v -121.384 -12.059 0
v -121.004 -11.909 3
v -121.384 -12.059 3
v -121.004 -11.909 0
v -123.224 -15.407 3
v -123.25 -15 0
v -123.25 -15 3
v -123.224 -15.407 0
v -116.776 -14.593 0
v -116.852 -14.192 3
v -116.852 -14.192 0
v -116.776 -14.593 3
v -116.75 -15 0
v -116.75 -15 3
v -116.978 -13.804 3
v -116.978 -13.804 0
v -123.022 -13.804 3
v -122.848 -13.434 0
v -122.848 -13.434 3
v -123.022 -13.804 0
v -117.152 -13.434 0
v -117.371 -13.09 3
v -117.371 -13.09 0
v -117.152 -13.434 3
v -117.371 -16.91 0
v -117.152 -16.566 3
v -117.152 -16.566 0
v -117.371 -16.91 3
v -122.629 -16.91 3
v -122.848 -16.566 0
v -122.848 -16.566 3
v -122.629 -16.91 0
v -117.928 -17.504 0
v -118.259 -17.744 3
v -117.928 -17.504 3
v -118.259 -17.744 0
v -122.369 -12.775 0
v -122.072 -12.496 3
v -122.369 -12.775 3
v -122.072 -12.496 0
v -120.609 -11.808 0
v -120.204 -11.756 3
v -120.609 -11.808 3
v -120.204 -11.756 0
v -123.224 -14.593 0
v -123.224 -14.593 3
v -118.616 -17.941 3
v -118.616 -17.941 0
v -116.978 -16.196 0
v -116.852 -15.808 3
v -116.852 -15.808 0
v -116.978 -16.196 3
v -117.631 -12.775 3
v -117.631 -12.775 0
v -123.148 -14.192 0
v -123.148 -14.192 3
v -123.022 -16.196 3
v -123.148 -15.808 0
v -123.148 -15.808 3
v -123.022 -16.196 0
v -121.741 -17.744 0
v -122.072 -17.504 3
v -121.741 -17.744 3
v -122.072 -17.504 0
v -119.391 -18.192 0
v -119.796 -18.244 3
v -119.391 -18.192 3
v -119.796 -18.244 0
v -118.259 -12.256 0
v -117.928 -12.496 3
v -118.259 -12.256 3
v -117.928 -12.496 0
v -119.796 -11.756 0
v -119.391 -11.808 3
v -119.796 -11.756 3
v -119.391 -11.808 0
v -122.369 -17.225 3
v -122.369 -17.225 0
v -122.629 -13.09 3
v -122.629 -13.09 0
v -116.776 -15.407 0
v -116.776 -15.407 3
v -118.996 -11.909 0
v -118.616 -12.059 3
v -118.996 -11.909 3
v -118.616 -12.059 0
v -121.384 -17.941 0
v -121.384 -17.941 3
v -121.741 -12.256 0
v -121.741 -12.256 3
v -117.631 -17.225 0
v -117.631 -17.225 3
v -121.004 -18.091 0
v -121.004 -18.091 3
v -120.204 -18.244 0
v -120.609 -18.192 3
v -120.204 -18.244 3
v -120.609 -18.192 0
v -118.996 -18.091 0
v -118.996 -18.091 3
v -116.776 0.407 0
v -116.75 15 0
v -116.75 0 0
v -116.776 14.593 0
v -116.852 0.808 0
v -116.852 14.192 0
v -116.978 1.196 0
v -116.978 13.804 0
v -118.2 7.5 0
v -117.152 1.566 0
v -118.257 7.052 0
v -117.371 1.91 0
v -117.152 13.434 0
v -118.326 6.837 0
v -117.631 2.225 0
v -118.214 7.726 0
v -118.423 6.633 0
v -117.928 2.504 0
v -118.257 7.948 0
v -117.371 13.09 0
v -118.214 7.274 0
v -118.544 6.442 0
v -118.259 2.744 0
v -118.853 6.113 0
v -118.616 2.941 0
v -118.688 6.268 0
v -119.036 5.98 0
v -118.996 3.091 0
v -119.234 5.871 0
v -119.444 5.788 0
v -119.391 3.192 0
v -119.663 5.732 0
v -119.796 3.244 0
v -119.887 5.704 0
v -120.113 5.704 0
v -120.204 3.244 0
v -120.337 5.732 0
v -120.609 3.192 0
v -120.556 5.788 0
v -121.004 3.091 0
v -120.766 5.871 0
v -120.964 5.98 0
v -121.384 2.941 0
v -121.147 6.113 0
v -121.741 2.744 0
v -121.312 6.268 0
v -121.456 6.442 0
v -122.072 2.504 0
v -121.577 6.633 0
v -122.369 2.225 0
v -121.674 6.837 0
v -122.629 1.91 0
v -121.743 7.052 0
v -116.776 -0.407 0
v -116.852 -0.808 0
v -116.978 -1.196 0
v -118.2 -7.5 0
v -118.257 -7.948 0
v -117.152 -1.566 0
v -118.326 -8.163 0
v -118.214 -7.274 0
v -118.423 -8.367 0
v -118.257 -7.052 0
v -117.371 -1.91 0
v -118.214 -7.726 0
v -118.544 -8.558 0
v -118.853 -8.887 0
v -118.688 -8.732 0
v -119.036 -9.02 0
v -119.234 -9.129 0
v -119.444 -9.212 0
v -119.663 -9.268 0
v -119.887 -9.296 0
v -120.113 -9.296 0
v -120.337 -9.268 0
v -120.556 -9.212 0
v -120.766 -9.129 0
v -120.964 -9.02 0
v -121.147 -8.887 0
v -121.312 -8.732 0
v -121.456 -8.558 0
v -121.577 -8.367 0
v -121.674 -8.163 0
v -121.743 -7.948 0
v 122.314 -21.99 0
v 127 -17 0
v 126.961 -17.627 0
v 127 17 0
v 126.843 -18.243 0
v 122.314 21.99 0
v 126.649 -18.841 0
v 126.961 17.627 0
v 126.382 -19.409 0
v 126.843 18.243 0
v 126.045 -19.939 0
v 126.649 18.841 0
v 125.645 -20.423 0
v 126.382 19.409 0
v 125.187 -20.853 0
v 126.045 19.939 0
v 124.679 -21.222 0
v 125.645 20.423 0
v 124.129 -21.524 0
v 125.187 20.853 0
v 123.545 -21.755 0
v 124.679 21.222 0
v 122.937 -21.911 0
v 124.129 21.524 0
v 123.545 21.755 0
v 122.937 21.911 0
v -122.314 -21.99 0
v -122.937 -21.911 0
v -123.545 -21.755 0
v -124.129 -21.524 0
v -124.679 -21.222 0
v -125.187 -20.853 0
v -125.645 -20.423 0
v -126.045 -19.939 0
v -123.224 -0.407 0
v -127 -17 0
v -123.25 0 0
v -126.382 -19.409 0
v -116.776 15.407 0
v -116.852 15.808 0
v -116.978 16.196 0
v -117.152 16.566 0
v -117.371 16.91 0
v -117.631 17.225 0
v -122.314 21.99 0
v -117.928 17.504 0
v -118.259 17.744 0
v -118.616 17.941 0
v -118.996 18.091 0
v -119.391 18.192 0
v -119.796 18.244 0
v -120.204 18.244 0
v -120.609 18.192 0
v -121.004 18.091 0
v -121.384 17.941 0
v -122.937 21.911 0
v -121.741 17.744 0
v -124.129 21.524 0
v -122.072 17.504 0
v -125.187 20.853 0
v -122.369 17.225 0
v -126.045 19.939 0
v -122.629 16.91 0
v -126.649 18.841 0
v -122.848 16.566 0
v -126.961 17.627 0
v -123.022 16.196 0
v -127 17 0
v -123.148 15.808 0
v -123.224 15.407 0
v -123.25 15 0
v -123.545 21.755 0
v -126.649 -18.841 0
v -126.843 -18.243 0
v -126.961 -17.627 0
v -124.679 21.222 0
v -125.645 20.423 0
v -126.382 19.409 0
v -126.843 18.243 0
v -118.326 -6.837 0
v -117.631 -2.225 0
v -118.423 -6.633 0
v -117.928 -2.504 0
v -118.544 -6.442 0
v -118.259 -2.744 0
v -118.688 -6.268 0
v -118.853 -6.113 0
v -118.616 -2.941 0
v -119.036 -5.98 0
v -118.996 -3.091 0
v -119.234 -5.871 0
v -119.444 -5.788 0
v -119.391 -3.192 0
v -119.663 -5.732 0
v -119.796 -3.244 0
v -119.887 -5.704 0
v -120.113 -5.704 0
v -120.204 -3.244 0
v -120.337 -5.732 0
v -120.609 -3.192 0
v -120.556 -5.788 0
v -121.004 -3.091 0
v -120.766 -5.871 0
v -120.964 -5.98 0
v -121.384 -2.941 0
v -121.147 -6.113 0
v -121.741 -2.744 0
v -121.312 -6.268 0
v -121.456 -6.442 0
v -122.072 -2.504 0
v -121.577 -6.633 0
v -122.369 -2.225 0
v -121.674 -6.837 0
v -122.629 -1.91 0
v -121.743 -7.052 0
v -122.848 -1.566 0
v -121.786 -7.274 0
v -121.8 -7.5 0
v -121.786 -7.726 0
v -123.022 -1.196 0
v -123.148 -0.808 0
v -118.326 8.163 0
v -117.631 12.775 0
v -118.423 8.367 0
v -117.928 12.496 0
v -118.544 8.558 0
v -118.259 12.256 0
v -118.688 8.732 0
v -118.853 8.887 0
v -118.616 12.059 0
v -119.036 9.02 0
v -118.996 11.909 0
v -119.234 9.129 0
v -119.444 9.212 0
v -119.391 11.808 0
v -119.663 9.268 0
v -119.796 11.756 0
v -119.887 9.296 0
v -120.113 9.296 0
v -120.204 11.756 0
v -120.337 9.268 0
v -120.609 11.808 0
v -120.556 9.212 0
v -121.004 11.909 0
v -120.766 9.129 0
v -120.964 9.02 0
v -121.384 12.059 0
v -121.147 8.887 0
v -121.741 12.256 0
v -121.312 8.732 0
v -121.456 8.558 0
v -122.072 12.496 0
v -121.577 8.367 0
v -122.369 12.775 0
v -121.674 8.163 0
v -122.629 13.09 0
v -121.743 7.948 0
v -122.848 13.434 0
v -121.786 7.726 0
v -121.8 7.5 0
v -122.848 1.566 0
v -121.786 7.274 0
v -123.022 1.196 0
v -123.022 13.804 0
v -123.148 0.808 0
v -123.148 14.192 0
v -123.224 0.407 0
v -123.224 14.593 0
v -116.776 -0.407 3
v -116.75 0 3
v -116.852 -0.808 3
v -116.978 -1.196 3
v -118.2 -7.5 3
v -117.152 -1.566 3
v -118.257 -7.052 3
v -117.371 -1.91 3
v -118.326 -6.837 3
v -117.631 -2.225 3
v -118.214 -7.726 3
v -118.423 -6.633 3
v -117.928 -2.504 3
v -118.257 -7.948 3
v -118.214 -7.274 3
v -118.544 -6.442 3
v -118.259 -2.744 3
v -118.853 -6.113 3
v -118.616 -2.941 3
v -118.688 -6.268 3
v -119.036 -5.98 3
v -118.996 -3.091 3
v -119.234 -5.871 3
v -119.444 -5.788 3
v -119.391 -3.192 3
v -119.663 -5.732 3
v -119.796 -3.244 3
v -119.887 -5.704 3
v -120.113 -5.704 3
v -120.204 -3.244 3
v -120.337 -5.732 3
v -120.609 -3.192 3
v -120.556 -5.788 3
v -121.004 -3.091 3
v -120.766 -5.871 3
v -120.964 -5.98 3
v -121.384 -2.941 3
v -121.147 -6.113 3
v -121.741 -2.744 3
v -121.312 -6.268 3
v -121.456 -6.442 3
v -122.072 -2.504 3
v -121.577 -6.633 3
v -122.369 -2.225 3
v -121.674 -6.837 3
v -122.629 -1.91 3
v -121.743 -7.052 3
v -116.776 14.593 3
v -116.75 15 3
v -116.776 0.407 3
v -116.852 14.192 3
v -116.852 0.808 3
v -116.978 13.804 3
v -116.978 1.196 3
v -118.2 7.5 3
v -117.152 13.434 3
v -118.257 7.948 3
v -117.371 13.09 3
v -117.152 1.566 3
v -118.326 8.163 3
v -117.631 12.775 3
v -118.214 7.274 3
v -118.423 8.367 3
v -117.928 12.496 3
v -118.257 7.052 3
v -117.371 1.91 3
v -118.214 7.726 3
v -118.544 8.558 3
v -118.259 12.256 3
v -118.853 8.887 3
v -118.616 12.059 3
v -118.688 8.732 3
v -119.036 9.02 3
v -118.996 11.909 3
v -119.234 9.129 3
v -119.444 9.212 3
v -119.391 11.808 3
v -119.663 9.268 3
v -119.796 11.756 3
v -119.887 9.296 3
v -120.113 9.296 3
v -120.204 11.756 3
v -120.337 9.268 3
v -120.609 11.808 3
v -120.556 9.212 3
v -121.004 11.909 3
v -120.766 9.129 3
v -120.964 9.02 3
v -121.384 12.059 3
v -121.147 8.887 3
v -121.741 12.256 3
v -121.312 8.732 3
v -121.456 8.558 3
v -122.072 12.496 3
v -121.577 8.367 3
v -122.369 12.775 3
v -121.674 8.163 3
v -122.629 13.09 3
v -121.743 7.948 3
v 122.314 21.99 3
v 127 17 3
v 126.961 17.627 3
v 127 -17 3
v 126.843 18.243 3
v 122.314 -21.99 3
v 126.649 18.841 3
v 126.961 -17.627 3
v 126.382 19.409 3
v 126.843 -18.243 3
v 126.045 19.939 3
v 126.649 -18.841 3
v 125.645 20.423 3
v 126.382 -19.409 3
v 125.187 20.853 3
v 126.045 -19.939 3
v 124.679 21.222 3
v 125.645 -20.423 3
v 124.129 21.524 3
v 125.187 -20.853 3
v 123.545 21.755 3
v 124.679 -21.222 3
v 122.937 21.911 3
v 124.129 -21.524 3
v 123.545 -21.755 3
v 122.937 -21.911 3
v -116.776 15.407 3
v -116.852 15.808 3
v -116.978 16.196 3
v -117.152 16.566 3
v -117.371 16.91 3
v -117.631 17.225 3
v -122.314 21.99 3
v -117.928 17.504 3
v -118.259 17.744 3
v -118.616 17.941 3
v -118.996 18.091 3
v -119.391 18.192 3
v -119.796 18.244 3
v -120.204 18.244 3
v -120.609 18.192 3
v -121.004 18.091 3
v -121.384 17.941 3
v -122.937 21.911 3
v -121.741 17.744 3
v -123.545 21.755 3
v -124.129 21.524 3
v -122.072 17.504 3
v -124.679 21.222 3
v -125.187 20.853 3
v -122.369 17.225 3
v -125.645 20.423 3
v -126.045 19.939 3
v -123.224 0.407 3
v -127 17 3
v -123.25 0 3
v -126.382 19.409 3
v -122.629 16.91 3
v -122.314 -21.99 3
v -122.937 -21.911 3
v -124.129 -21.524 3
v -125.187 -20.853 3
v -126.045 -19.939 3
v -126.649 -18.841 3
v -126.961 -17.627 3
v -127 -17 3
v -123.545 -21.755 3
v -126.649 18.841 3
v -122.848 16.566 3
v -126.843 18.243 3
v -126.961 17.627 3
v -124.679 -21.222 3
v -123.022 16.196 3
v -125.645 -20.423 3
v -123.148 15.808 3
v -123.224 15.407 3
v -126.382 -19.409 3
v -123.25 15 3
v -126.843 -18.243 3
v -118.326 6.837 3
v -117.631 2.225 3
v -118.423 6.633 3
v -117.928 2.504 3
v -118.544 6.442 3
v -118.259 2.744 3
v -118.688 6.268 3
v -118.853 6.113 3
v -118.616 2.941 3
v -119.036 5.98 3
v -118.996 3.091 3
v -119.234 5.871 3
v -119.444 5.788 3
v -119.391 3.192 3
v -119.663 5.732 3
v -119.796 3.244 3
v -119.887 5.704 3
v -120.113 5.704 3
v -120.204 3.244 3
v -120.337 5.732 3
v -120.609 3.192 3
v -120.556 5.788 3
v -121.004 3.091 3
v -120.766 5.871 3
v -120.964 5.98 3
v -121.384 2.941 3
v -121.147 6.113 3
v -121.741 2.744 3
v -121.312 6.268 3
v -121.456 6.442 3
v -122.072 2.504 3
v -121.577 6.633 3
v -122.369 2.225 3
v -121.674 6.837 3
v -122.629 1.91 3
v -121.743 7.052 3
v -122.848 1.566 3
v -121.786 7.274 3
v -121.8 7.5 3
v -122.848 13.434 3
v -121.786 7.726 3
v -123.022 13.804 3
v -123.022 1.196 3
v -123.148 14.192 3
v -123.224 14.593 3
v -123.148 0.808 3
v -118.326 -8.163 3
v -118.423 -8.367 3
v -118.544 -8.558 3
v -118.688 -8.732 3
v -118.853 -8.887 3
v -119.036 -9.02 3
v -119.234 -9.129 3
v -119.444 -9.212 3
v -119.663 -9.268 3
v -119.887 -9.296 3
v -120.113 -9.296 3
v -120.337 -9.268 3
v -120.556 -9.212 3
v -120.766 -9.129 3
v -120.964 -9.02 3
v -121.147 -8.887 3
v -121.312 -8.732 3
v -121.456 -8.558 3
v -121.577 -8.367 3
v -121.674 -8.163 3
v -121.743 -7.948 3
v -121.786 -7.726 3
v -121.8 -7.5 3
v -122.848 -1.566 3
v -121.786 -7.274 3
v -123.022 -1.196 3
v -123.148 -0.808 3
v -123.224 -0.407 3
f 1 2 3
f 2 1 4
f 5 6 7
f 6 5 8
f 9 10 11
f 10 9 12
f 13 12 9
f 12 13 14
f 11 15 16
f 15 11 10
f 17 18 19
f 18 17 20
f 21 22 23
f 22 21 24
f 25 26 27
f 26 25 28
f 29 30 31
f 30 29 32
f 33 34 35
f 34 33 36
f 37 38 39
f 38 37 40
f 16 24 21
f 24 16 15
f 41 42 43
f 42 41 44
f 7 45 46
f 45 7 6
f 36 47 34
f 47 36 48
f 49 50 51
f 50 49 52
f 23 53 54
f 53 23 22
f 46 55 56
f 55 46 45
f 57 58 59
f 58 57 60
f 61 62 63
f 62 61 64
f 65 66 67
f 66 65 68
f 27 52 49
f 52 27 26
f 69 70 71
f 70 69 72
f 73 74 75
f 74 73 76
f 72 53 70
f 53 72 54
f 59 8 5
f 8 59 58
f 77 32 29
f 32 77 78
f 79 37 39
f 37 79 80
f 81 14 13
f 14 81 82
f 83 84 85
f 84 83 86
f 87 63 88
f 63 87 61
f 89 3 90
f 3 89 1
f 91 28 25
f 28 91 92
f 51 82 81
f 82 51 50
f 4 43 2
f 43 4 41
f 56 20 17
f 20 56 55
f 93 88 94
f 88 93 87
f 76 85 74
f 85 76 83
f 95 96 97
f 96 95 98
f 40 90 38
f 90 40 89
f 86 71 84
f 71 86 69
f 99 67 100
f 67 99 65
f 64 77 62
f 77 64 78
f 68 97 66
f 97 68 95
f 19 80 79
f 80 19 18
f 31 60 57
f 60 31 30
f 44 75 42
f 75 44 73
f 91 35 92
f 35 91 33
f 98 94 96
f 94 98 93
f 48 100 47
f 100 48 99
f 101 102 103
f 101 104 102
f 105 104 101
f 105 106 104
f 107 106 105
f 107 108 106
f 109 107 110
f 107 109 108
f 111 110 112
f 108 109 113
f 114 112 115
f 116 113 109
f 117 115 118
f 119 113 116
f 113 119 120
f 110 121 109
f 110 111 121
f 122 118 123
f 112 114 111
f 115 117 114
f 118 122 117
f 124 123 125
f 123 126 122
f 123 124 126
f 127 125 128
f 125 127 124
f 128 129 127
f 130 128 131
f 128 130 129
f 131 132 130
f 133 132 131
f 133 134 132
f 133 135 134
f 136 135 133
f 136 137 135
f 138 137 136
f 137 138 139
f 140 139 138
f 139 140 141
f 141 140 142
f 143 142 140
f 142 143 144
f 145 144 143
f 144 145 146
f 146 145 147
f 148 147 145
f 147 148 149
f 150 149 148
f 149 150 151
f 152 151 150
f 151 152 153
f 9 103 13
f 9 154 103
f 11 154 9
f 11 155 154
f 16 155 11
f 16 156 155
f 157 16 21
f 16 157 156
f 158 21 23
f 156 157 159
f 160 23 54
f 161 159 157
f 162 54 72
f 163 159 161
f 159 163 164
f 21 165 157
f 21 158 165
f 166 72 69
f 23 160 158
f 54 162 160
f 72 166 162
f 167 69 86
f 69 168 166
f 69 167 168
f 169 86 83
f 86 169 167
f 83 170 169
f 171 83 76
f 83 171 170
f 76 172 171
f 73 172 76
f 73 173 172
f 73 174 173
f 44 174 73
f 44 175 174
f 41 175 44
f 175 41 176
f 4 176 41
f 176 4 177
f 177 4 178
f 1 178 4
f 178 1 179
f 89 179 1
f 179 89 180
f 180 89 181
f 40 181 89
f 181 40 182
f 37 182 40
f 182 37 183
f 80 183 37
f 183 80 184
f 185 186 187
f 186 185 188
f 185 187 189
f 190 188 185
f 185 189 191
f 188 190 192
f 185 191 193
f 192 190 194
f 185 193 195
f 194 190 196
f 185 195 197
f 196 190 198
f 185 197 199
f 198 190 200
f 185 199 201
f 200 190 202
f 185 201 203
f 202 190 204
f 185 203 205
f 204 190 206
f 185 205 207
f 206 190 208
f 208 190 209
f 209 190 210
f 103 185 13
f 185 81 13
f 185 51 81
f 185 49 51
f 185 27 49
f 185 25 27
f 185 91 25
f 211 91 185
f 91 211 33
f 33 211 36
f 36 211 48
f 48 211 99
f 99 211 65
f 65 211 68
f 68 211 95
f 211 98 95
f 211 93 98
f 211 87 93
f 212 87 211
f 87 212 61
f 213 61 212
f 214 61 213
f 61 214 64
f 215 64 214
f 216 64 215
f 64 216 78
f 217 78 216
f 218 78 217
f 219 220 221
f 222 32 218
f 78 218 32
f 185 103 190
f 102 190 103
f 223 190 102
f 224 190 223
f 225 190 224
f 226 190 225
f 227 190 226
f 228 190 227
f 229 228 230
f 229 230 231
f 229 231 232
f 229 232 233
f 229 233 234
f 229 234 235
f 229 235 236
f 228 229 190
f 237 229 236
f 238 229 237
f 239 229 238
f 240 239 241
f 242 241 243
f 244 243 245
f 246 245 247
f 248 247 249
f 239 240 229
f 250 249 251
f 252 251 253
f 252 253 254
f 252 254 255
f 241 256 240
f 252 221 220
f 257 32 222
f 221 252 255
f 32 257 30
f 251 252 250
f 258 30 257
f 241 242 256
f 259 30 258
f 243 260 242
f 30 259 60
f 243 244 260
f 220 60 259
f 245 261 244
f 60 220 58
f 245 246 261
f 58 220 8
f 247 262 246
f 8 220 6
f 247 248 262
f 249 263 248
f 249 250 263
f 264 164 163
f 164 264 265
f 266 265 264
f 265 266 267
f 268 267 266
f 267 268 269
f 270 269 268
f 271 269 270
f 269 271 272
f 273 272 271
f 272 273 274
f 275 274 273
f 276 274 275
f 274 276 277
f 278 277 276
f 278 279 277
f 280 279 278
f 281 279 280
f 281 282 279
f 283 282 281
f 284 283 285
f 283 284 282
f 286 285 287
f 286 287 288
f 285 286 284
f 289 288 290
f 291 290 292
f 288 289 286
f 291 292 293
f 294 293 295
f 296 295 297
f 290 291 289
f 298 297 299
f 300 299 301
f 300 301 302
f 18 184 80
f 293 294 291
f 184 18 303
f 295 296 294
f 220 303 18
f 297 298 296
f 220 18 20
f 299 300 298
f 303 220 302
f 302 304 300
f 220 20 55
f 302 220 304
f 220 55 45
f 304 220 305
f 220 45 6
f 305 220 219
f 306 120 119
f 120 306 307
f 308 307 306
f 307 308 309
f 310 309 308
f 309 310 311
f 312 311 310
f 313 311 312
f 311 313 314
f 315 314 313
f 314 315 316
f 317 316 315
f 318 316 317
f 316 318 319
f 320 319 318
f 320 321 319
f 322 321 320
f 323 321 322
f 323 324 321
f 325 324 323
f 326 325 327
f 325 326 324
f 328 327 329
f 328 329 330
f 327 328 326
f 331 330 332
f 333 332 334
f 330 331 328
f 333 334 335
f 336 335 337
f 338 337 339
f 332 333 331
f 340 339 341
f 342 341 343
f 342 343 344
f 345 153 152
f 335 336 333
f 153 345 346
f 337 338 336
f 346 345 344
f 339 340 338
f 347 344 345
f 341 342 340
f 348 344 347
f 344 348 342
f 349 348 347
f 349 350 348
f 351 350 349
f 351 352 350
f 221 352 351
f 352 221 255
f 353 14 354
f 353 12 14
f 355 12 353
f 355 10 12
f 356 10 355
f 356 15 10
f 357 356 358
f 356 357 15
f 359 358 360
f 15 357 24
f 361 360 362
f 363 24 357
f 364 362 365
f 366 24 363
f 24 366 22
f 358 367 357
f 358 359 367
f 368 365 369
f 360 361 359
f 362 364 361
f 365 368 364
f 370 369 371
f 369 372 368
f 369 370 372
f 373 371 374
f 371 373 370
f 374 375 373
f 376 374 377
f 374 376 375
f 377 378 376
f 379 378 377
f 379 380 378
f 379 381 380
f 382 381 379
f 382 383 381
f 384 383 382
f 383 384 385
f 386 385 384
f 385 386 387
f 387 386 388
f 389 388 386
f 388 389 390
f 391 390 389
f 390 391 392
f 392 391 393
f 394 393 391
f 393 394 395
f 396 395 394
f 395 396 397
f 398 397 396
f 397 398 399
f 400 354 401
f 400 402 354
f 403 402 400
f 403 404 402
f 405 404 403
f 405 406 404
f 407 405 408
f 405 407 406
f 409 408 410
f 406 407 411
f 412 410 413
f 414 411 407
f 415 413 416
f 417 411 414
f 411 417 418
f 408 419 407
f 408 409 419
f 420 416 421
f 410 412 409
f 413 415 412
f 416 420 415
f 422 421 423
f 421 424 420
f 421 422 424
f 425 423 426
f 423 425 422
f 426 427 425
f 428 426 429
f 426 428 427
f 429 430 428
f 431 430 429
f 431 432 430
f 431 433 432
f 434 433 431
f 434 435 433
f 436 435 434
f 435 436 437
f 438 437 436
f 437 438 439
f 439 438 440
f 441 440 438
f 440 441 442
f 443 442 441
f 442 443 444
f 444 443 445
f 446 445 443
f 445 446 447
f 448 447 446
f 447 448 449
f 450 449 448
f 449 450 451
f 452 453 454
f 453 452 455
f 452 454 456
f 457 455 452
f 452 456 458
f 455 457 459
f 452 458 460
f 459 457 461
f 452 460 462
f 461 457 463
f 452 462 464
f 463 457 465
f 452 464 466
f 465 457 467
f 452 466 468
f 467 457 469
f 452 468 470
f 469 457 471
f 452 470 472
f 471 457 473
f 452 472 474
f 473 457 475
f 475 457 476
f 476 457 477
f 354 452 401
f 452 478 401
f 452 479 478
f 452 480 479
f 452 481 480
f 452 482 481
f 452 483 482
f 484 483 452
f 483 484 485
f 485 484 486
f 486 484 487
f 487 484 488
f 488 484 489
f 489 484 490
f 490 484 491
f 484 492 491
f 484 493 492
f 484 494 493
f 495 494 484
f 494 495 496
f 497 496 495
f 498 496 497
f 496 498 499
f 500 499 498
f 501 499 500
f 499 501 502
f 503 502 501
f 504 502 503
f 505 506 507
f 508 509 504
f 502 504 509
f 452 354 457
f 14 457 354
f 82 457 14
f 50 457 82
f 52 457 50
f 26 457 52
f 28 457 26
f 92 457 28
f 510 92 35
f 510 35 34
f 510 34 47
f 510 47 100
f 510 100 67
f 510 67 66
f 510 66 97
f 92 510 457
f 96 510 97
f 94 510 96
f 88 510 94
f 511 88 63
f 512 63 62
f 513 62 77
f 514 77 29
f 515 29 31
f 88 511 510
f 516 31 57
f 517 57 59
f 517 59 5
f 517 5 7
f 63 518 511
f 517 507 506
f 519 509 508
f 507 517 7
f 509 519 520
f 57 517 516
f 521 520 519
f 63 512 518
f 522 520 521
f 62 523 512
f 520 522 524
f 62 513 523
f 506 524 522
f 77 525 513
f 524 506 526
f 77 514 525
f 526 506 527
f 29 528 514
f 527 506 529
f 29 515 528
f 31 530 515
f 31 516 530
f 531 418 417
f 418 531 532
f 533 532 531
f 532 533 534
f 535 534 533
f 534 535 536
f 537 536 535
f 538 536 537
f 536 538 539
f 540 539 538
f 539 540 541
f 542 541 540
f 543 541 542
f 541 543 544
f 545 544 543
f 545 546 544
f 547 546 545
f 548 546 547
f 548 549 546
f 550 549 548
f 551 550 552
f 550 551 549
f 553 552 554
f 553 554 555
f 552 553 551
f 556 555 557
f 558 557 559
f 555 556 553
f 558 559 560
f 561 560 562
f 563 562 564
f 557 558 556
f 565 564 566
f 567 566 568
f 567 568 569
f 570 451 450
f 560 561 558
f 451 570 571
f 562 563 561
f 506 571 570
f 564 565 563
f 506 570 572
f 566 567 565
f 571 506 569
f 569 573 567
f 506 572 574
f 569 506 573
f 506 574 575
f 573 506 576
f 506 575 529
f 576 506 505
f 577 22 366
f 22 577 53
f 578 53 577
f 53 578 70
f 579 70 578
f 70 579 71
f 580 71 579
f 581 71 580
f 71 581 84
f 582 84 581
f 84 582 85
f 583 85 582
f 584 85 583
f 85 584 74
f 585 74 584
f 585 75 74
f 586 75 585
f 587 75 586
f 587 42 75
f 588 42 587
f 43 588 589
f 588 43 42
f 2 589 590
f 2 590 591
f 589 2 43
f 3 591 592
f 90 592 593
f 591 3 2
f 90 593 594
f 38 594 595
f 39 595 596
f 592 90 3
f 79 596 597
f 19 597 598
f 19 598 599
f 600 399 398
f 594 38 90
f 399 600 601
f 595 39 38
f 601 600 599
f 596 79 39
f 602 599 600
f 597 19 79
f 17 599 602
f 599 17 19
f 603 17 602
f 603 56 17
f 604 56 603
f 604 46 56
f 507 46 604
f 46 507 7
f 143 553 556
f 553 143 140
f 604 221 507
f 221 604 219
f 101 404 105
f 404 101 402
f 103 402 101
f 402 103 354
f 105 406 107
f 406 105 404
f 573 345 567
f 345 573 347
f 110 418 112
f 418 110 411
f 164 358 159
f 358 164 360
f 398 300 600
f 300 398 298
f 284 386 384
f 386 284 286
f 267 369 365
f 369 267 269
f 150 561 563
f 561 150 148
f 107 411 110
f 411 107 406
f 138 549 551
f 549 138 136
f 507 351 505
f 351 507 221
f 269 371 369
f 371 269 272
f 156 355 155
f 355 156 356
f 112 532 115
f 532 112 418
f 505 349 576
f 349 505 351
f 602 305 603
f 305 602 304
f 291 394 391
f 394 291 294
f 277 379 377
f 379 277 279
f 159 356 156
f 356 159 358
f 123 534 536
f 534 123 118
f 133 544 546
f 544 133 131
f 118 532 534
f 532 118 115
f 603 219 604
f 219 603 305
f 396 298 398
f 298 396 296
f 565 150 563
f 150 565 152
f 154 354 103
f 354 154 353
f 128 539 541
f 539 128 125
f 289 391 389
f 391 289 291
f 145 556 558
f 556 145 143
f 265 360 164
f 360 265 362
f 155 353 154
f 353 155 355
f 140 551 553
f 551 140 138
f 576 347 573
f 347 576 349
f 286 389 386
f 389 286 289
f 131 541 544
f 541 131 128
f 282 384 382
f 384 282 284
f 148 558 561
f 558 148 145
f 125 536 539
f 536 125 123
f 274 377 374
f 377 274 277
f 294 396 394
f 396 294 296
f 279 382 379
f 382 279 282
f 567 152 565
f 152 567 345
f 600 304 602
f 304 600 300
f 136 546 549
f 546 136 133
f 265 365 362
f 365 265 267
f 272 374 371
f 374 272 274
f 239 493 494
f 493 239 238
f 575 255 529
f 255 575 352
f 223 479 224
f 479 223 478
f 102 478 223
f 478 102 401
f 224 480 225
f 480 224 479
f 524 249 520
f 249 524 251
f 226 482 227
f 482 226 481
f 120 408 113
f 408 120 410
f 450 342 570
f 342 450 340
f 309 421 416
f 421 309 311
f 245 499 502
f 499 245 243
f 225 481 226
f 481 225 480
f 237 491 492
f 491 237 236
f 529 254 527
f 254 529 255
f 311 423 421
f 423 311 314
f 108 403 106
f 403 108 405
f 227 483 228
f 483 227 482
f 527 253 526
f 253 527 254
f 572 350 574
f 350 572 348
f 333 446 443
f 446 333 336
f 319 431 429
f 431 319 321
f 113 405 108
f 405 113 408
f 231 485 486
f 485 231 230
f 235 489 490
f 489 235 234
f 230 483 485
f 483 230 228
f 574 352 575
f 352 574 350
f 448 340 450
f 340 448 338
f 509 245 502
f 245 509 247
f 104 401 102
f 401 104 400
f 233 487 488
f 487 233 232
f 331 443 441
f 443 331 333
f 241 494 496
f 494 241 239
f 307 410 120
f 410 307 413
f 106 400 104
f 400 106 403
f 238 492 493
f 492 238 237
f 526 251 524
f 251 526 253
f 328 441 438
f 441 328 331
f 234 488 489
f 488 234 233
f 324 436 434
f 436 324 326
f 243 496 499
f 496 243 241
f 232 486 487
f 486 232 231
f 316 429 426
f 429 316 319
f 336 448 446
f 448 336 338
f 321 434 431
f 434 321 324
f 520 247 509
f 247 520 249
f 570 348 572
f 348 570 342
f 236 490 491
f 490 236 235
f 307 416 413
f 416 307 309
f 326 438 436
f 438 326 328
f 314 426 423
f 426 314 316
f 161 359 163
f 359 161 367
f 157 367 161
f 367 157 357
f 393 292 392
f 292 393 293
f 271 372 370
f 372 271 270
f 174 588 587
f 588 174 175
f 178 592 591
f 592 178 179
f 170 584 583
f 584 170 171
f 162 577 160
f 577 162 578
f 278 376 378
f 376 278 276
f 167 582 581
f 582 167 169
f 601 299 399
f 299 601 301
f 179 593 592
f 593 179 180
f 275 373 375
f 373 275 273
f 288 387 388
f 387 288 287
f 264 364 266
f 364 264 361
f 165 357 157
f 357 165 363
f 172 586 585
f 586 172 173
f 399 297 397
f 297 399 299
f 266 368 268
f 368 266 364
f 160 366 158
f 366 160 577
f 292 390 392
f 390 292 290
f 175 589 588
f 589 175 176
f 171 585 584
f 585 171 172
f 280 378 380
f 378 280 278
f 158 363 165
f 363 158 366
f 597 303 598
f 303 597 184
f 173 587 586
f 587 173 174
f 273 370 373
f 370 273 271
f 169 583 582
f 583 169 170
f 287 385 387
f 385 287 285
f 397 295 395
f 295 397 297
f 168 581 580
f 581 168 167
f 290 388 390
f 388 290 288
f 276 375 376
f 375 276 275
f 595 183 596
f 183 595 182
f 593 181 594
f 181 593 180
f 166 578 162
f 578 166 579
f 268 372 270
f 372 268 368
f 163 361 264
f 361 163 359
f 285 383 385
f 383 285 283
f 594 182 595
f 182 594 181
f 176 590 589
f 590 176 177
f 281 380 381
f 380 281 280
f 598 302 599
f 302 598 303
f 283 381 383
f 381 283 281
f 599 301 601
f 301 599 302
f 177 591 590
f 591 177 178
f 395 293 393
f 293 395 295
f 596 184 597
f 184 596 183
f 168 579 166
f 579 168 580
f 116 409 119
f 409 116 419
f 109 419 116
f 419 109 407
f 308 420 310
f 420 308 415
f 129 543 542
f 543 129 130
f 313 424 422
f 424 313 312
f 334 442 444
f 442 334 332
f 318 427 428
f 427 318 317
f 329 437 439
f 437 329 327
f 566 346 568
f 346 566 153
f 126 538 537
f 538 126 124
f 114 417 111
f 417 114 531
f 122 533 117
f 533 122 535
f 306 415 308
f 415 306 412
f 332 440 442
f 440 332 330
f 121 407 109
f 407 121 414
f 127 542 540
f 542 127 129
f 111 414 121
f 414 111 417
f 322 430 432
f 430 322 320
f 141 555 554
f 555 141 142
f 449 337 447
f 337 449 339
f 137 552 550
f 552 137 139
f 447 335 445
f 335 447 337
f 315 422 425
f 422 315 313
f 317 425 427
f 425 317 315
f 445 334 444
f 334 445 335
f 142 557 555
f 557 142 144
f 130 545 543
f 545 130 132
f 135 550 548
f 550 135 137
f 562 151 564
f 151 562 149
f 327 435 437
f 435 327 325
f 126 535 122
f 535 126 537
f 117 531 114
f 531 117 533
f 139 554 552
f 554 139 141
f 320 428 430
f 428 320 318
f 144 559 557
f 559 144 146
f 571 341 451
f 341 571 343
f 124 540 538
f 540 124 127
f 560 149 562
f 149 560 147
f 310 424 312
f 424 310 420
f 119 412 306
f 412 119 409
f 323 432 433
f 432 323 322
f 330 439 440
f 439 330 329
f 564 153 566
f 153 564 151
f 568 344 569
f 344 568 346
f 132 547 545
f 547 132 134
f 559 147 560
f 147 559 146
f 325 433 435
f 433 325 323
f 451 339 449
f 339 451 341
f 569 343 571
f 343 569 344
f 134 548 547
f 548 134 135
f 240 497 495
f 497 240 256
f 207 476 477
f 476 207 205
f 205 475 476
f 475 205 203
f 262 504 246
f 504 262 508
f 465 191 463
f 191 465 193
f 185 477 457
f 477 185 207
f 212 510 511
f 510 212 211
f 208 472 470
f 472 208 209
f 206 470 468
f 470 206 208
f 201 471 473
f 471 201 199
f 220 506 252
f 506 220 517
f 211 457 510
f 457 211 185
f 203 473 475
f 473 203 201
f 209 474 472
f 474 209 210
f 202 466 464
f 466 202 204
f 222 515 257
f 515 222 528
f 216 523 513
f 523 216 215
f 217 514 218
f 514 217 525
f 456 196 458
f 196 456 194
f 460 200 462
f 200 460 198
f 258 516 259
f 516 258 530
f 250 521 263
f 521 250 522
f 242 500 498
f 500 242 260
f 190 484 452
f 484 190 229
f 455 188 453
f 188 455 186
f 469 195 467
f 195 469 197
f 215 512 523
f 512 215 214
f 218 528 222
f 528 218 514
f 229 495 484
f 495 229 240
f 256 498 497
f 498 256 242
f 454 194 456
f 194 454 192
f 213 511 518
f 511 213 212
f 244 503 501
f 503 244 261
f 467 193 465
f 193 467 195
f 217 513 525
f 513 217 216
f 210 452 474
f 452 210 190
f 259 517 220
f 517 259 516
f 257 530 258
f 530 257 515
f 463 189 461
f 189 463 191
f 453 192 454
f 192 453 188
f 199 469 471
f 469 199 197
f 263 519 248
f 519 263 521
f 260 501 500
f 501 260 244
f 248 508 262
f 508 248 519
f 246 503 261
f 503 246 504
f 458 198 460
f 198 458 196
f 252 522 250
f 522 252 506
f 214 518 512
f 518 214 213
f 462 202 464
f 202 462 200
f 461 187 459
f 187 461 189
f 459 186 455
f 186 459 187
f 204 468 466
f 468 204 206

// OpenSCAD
$fn = 50;


difference() {
	union() {
		hull() {
			translate(v = [-122.0000000000, 17.0000000000, 0]) {
				cylinder(h = 3, r = 5);
			}
			translate(v = [122.0000000000, 17.0000000000, 0]) {
				cylinder(h = 3, r = 5);
			}
			translate(v = [-122.0000000000, -17.0000000000, 0]) {
				cylinder(h = 3, r = 5);
			}
			translate(v = [122.0000000000, -17.0000000000, 0]) {
				cylinder(h = 3, r = 5);
			}
		}
	}
	union() {
		translate(v = [-120.0000000000, -15.0000000000, 0]) {
			cylinder(h = 3, r = 3.2500000000);
		}
		translate(v = [-120.0000000000, 0.0000000000, 0]) {
			cylinder(h = 3, r = 3.2500000000);
		}
		translate(v = [-120.0000000000, 15.0000000000, 0]) {
			cylinder(h = 3, r = 3.2500000000);
		}
		translate(v = [-120.0000000000, -15.0000000000, 0]) {
			cylinder(h = 3, r = 1.8000000000);
		}
		translate(v = [-120.0000000000, -7.5000000000, 0]) {
			cylinder(h = 3, r = 1.8000000000);
		}
		translate(v = [-120.0000000000, 0.0000000000, 0]) {
			cylinder(h = 3, r = 1.8000000000);
		}
		translate(v = [-120.0000000000, 7.5000000000, 0]) {
			cylinder(h = 3, r = 1.8000000000);
		}
		translate(v = [-120.0000000000, 15.0000000000, 0]) {
			cylinder(h = 3, r = 1.8000000000);
		}
		translate(v = [-120.0000000000, -15.0000000000, 0]) {
			cylinder(h = 3, r = 1.8000000000);
		}
		translate(v = [-120.0000000000, -7.5000000000, 0]) {
			cylinder(h = 3, r = 1.8000000000);
		}
		translate(v = [-120.0000000000, 0.0000000000, 0]) {
			cylinder(h = 3, r = 1.8000000000);
		}
		translate(v = [-120.0000000000, 7.5000000000, 0]) {
			cylinder(h = 3, r = 1.8000000000);
		}
		translate(v = [-120.0000000000, 15.0000000000, 0]) {
			cylinder(h = 3, r = 1.8000000000);
		}
		translate(v = [-120.0000000000, -15.0000000000, 0]) {
			cylinder(h = 3, r = 1.8000000000);
		}
		translate(v = [-120.0000000000, -7.5000000000, 0]) {
			cylinder(h = 3, r = 1.8000000000);
		}
		translate(v = [-120.0000000000, 0.0000000000, 0]) {
			cylinder(h = 3, r = 1.8000000000);
		}
		translate(v = [-120.0000000000, 7.5000000000, 0]) {
			cylinder(h = 3, r = 1.8000000000);
		}
		translate(v = [-120.0000000000, 15.0000000000, 0]) {
			cylinder(h = 3, r = 1.8000000000);
		}
	}
}
